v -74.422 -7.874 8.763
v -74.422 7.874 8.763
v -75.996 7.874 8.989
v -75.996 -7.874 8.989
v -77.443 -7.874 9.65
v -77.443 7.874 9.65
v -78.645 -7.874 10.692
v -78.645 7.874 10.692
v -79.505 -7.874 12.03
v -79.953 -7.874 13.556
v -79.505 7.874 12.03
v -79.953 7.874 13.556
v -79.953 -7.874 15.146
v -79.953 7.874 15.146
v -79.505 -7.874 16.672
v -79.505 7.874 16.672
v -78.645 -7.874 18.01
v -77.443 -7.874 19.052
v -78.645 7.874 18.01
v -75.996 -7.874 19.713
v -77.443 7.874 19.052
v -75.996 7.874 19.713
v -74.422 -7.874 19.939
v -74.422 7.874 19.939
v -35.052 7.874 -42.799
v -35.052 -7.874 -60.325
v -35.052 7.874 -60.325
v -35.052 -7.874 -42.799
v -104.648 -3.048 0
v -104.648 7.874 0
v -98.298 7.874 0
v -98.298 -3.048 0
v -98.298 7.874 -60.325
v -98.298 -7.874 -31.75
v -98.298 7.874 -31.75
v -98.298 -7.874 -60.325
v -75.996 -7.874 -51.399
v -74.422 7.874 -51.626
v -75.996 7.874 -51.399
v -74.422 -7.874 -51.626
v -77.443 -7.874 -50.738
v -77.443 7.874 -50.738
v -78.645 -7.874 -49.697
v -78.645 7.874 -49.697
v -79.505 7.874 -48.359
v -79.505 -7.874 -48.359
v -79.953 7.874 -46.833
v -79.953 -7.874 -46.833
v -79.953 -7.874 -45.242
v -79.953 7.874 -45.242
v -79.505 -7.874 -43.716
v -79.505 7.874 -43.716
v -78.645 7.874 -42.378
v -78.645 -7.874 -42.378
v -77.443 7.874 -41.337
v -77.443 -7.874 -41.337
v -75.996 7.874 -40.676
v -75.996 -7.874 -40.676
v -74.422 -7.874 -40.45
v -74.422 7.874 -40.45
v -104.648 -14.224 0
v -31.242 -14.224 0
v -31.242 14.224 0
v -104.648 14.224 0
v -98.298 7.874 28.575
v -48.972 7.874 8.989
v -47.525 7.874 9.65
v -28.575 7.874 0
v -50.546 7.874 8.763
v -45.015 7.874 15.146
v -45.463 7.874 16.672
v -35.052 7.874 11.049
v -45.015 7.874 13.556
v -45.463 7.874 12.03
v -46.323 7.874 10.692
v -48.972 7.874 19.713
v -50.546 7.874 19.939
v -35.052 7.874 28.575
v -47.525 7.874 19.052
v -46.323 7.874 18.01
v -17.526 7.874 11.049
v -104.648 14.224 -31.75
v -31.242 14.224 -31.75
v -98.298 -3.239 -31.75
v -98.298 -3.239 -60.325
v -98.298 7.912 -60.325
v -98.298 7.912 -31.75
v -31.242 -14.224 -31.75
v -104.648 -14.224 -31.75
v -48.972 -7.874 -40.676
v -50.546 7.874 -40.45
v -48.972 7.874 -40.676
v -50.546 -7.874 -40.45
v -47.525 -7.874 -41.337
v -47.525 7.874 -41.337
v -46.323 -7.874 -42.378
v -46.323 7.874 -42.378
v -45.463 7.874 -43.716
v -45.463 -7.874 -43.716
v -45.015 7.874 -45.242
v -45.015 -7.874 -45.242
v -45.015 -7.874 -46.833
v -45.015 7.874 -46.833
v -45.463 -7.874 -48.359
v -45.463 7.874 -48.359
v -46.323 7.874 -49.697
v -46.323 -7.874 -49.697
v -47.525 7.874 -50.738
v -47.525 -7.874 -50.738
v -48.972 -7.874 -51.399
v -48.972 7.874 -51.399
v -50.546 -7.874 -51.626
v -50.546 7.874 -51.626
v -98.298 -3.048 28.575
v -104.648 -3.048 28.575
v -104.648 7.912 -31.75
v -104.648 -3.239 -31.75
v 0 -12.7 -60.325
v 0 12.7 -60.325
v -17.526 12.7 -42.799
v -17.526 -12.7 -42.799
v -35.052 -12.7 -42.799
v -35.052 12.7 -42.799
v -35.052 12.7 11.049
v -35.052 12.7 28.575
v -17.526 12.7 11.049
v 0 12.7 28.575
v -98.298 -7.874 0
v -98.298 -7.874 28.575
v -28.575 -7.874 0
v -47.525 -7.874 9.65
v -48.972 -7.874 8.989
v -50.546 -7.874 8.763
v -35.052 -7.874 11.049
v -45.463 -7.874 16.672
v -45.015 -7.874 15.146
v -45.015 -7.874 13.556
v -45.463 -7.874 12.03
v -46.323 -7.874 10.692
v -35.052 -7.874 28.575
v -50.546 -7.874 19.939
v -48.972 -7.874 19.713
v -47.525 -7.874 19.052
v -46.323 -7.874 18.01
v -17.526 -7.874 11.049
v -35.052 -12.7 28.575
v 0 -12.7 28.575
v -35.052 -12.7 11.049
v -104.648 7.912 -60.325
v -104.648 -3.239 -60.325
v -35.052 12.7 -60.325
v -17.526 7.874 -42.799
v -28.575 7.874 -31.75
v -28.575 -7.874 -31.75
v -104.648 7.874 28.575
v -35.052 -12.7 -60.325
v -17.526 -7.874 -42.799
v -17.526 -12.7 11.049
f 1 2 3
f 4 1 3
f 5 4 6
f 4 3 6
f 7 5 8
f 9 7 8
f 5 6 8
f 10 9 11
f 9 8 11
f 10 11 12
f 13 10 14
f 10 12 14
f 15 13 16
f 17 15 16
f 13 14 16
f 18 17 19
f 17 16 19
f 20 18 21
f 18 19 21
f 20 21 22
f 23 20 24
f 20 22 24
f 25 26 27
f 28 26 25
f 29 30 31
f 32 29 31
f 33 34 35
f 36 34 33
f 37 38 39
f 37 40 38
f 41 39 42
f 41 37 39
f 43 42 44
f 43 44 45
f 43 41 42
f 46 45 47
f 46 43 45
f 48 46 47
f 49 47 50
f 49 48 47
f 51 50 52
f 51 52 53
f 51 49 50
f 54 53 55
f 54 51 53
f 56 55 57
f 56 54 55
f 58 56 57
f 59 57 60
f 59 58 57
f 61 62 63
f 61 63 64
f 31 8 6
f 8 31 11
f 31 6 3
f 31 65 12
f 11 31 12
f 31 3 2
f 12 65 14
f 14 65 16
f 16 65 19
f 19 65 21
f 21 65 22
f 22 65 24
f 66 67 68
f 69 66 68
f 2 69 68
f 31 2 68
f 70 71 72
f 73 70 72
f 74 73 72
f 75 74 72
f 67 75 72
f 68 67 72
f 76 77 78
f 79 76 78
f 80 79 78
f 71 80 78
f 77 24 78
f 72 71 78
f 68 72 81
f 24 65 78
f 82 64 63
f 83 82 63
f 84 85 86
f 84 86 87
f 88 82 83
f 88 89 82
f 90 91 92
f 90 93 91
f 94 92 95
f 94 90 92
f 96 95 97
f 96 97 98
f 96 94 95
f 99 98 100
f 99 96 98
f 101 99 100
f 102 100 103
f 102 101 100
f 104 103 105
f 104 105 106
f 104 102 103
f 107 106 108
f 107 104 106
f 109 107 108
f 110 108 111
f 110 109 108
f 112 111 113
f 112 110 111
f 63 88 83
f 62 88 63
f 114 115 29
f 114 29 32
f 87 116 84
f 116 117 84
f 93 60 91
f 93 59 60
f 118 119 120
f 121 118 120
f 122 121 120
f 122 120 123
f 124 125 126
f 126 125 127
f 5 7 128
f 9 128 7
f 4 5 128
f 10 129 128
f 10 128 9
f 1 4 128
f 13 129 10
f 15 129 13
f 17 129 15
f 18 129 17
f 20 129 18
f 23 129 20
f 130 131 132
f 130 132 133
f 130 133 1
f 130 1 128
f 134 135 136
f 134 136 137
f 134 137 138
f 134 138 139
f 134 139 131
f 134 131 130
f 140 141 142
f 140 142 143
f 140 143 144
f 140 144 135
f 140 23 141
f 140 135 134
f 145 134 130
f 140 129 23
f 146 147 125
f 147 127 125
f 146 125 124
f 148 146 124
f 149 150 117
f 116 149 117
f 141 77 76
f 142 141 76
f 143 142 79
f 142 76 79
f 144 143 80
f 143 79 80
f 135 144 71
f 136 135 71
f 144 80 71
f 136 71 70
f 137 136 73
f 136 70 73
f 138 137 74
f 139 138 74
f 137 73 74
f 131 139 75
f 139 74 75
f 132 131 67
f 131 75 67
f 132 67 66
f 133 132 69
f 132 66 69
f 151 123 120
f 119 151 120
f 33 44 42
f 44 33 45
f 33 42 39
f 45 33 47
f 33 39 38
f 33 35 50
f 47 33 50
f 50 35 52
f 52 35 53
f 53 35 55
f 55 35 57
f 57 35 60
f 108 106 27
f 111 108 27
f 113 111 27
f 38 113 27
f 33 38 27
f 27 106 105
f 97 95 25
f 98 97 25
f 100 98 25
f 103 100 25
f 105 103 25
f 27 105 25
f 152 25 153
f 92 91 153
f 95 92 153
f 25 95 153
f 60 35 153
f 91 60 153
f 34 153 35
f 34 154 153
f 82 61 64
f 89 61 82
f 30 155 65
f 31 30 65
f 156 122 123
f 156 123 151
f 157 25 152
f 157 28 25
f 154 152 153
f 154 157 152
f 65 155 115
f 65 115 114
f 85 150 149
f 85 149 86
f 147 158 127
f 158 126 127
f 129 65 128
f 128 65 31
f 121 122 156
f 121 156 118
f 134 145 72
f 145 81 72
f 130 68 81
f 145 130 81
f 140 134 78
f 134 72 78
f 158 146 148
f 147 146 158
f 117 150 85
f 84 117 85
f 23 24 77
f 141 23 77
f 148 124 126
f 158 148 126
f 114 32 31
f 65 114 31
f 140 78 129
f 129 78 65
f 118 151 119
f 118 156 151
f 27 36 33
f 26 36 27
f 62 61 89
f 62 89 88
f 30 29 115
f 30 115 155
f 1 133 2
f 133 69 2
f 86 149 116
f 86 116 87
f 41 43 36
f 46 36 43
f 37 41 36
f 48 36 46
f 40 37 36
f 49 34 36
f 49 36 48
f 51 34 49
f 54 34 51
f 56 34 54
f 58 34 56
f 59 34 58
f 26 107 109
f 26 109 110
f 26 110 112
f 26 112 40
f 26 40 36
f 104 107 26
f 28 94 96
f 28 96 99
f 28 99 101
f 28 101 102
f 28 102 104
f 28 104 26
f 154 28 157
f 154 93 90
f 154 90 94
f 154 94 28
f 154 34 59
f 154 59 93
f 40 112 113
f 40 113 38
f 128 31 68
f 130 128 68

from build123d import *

# Parameters (mm, degrees)
F1_DEPTH      = 14.224
F2_DEPTH      = 12.7
F3_DEPTH      = 7.874
F4_W          = 6.35
F4_H          = 10.922
F5_DEPTH      = 28.575
F0_W          = 6.35
F0_H          = 28.575
F6_DEPTH      = 3.238748
F6_DEPTH_BACK = 7.912253


with BuildPart() as f1:
    # F0 (on Front) → F1 (new body, symmetric)
    with BuildSketch(Plane.XZ):
        Polygon((-31.242, -31.75), (-31.242, 0), (-98.298, 0), (-104.648, 0), (-104.648, -31.75), (-98.298, -31.75), align=None)
    extrude(amount=F1_DEPTH, both=True)


with BuildPart() as f2:
    # F0 (on Front) → F2 (new body, symmetric)
    with BuildSketch(Plane.XZ):
        Polygon((-35.052, 11.049), (-17.526, 11.049), (0, 28.575), (-35.052, 28.575), align=None)
        Polygon((0, -60.325), (-17.526, -42.799), (-35.052, -42.799), (-35.052, -60.325), align=None)
    extrude(amount=F2_DEPTH, both=True)


with BuildPart() as f3:
    # F0 (on Front) → F3 (new body, symmetric)
    with BuildSketch(Plane.XZ):
        Polygon((-31.242, 0), (-28.575, 0), (-17.526, 11.049), (-35.052, 11.049), (-35.052, 28.575), (-98.298, 28.575), (-98.298, 0), align=None)
        with BuildLine():
            Line((-50.546, 8.763), (-74.422, 8.763))
            ThreePointArc((-74.422, 8.763), (-80.01, 14.351), (-74.422, 19.939))
            Line((-74.422, 19.939), (-50.546, 19.939))
            ThreePointArc((-50.546, 19.939), (-44.958, 14.351), (-50.546, 8.763))
        make_face(mode=Mode.SUBTRACT)
        Polygon((-28.575, -31.75), (-31.242, -31.75), (-98.298, -31.75), (-98.298, -60.325), (-35.052, -60.325), (-35.052, -42.799), (-17.526, -42.799), align=None)
        with BuildLine():
            Line((-50.546, -51.6255), (-74.422, -51.6255))
            ThreePointArc((-74.422, -51.6255), (-80.01, -46.0375), (-74.422, -40.4495))
            Line((-74.422, -40.4495), (-50.546, -40.4495))
            ThreePointArc((-50.546, -40.4495), (-44.958, -46.0375), (-50.546, -51.6255))
        make_face(mode=Mode.SUBTRACT)
    extrude(amount=F3_DEPTH, both=True)


with BuildPart() as f5:
    # F4 (on Top) → F5 (new body)
    with BuildSketch(Plane.XY):
        with Locations((-101.473, 2.413)):
            Rectangle(F4_W, F4_H)
    extrude(amount=F5_DEPTH)


with BuildPart() as f6:
    # F0 (on Front) → F6 (new body, two sides)
    with BuildSketch(Plane.XZ) as f6_sk:
        with Locations((-101.473, -46.0375)):
            Rectangle(F0_W, F0_H)
    extrude(amount=F6_DEPTH)
    extrude(f6_sk.sketch, amount=-F6_DEPTH_BACK)


solid = Compound([f1.part, f2.part, f3.part, f5.part, f6.part])
